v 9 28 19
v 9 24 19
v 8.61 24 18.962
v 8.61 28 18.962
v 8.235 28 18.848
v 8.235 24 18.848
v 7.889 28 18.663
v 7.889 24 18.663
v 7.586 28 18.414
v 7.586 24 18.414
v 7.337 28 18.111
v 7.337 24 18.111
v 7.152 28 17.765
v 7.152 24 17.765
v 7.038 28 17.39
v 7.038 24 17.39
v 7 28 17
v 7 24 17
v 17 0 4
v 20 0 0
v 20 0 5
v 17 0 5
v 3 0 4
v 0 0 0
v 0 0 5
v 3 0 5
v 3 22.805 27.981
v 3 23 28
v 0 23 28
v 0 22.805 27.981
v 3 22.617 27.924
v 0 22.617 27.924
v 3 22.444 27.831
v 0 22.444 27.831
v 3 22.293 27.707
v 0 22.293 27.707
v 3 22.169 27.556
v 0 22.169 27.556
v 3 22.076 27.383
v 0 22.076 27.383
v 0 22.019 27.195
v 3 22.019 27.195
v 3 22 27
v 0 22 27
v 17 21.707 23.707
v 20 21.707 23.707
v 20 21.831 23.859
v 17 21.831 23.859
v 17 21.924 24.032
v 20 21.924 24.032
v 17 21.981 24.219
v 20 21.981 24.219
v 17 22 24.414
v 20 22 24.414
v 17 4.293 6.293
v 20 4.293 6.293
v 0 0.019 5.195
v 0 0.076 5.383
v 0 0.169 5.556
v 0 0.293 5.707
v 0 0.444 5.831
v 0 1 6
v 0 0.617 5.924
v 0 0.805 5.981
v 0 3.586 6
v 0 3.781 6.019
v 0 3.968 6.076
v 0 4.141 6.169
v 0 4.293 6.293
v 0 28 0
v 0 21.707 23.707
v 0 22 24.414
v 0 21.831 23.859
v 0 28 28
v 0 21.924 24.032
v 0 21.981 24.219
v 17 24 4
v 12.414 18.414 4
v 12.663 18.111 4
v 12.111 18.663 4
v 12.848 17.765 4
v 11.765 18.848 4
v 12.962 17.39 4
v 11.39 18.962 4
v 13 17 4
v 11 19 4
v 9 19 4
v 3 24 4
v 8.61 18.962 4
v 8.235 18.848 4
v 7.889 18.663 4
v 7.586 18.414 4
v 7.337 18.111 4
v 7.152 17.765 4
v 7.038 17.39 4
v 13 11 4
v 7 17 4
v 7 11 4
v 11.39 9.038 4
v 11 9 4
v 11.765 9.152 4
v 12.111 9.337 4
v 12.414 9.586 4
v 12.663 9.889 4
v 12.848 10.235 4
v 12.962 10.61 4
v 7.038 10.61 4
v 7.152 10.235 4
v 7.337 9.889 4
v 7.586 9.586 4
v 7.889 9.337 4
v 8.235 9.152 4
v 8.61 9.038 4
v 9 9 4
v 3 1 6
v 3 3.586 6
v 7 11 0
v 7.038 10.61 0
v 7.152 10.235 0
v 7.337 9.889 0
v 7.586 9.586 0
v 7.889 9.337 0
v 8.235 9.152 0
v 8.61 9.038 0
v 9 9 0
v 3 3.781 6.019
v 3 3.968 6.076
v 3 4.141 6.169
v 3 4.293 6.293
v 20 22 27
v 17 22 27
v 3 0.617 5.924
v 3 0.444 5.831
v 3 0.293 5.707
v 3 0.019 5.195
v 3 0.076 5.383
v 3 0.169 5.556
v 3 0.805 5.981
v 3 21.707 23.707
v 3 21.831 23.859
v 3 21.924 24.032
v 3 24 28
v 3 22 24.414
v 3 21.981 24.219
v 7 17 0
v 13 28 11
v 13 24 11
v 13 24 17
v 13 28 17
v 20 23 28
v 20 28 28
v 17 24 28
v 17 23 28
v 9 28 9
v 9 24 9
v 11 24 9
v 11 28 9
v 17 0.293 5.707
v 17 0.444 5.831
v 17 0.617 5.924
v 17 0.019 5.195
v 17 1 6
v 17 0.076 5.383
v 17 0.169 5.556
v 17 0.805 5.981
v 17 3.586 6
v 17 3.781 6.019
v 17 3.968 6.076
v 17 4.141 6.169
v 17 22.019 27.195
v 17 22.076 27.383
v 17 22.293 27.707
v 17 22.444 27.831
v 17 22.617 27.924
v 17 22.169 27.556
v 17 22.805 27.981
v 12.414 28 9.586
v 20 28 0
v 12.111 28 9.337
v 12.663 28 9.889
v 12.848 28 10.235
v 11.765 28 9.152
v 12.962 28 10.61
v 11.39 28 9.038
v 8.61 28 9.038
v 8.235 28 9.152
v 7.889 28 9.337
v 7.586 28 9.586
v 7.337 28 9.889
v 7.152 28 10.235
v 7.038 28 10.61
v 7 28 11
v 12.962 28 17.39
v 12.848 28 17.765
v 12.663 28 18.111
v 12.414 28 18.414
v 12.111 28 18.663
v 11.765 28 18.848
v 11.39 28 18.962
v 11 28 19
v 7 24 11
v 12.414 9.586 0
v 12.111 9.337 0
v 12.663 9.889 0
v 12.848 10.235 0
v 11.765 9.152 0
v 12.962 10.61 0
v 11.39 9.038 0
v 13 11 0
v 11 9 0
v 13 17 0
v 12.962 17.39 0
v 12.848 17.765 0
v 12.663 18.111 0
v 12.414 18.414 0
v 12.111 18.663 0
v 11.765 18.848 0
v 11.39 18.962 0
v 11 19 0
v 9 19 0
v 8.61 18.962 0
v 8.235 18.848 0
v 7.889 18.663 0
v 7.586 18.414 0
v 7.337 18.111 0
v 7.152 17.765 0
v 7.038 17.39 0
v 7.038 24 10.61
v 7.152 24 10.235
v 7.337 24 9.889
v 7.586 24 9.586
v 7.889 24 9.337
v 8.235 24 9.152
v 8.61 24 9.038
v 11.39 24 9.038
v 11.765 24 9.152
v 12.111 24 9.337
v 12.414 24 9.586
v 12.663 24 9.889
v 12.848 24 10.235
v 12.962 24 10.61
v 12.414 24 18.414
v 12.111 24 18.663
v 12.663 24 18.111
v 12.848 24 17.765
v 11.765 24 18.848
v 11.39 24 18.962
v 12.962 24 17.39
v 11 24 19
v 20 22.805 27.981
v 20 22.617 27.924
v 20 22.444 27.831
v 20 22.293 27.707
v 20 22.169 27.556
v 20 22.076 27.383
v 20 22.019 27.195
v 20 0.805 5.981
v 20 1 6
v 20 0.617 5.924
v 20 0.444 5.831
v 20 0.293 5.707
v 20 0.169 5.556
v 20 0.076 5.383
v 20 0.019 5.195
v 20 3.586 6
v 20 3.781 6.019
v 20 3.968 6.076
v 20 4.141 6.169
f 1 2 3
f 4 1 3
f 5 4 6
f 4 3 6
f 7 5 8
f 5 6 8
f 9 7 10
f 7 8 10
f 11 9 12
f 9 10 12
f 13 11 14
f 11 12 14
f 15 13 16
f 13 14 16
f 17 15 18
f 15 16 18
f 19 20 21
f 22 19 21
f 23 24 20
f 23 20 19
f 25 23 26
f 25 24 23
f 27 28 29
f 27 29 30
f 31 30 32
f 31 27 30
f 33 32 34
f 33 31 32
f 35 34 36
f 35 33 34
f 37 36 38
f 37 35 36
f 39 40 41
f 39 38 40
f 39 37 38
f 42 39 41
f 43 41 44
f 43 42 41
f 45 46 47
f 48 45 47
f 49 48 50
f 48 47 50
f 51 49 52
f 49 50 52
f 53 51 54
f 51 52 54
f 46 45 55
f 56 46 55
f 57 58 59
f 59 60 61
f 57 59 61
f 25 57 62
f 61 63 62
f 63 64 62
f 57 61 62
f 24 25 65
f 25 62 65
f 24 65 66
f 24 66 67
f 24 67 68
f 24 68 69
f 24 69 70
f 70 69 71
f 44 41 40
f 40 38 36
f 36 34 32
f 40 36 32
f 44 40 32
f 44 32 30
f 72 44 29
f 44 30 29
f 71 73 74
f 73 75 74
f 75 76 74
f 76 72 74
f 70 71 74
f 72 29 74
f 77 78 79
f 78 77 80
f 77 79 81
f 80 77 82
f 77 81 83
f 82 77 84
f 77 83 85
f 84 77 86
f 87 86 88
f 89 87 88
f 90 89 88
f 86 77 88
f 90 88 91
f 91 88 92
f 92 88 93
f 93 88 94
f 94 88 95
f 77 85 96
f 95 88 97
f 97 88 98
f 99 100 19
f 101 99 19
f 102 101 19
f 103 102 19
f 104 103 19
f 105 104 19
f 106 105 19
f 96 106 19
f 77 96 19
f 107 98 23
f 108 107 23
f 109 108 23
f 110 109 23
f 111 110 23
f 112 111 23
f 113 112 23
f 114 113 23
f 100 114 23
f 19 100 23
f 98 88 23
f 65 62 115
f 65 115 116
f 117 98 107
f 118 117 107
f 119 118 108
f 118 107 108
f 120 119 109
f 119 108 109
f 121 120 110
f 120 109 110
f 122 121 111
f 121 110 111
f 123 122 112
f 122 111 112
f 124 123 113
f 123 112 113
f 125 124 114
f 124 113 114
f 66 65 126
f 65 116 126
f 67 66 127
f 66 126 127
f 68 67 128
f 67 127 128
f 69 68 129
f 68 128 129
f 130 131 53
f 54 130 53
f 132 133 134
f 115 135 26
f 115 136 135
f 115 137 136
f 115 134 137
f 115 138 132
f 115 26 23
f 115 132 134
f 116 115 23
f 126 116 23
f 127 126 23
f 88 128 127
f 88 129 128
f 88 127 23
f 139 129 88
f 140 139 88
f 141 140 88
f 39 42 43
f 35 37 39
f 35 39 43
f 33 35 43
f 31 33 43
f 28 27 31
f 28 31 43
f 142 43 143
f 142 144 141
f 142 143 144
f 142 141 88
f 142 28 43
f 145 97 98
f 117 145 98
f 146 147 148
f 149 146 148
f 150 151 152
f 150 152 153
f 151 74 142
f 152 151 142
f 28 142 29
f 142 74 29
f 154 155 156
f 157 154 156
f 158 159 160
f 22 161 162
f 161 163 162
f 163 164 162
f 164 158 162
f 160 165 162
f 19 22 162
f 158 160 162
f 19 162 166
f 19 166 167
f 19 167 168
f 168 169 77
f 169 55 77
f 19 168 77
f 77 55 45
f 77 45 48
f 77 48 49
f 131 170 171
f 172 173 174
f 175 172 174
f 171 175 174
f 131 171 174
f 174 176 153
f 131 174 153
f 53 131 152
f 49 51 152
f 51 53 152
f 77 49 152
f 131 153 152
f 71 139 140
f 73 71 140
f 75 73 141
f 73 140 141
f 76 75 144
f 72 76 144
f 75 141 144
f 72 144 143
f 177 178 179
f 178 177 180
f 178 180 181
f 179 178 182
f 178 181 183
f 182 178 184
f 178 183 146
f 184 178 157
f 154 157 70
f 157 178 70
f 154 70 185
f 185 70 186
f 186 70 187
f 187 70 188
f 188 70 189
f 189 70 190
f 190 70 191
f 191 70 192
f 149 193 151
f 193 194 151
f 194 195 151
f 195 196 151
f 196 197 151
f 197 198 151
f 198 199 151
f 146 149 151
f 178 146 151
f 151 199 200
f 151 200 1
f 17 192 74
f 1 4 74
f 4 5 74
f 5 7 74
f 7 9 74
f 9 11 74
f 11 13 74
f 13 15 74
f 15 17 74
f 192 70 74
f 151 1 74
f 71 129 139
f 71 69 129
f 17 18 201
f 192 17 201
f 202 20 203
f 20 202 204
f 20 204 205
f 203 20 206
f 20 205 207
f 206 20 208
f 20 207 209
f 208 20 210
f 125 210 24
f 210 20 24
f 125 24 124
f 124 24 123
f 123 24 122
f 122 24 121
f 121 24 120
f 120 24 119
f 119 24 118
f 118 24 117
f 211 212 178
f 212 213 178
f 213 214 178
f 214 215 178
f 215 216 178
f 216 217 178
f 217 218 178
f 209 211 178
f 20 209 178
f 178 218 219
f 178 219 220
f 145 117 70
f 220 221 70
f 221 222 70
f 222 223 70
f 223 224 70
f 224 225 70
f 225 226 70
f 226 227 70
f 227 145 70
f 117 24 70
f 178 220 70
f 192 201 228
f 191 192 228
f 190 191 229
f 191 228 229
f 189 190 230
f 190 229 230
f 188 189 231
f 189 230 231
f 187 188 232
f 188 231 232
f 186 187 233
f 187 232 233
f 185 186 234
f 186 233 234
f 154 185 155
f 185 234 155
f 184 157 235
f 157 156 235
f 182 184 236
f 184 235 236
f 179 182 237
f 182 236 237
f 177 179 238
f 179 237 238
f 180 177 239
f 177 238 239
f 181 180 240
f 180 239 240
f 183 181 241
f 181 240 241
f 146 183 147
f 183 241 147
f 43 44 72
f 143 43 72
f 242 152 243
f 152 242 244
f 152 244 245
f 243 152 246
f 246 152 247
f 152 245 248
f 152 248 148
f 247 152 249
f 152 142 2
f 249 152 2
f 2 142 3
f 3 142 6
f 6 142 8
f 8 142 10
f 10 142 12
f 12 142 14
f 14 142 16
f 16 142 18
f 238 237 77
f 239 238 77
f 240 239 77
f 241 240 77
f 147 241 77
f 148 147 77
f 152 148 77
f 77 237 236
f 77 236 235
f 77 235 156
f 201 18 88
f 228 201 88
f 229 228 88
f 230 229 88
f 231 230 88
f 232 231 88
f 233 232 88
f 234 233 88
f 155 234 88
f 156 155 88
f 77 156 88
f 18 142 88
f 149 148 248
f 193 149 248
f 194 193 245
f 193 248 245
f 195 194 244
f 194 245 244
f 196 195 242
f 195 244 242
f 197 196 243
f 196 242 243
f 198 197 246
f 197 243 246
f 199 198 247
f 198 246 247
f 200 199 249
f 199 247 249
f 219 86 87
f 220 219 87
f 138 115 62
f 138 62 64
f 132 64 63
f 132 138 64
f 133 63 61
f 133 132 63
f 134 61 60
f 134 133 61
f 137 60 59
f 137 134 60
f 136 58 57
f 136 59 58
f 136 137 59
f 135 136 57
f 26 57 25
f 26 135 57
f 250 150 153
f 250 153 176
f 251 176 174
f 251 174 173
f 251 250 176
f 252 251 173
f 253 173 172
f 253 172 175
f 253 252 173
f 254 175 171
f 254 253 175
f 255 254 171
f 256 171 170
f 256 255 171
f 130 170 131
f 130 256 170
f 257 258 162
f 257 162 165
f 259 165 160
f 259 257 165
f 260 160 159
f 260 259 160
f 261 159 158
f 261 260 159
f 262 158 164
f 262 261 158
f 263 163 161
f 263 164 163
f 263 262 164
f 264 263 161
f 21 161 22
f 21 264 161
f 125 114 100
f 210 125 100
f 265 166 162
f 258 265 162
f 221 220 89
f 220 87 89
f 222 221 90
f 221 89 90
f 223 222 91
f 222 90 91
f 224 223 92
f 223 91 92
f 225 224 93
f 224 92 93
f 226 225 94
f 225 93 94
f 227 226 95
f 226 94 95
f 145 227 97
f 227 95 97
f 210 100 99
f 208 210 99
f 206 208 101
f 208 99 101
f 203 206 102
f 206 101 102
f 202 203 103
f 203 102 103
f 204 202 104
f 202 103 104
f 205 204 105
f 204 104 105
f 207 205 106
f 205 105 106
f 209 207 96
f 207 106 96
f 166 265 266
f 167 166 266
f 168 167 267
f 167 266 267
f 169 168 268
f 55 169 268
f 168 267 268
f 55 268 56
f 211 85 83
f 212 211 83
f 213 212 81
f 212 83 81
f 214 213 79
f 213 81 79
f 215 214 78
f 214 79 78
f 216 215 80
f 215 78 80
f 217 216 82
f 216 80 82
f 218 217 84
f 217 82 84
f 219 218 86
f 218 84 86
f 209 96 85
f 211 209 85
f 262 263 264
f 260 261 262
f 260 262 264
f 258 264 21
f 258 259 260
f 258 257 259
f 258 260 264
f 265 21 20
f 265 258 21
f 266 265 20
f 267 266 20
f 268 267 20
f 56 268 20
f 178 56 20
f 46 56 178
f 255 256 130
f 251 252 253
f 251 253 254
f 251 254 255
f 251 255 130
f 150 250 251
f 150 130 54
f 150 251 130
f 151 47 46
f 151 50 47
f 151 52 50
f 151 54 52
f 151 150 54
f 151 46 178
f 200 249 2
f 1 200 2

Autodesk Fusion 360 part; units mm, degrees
sketch "Sketch1" plane through (0, 0, 0) normal (1, 0, 0) x (0, 1, 0)
  line L0 (0, 0) -> (28, 0)
  line L1 (28, 0) -> (28, 28)
  line L2 (28, 28) -> (22, 28)
  line L3 (22, 28) -> (22, 24)
  line L4 (0, 0) -> (0, 6)
  line L5 (0, 6) -> (4, 6)
  line L6 (4, 6) -> (22, 24)
  dimension "d1" = 28
  dimension "d2" = 28
extrude "Extrude1" add sketch "Sketch1" along normal blind 3
sketch "Sketch2" plane through (3, 0, 0) normal (1, 0, 0) x (0, 1, 0)
  line L0 (0, 0) -> (28, 0)
  line L1 (28, 0) -> (28, 28)
  line L2 (28, 28) -> (22, 28)
  line L3 (22, 28) -> (22, 24)
  line L4 (22, 24) -> (4, 6)
  line L5 (4, 6) -> (0, 6)
  line L6 (0, 6) -> (0, 0)
  line L7 (0, 0) -> (28, 0)
  line L8 (28, 0) -> (28, 4)
  line L9 (24, 4) -> (0, 4)
  line L10 (0, 4) -> (0, 0)
  line L11 (28, 28) -> (24, 28)
  line L12 (24, 28) -> (24, 4)
  line L13 (24, 0) -> (28, 0)
  line L14 (28, 0) -> (28, 28)
  dimension "d5" = 4
  dimension "d6" = 28
extrude "Extrude2" add sketch "Sketch2" along normal blind 14 contours L0 L1 L2 L6 L7 L8 L9 L10 L11 L12 L13 L14
sketch "Sketch3" plane through (17, 0, 0) normal (1, 0, 0) x (0, 1, 0)
  line L0 (28, 0) -> (28, 28)
  line L1 (28, 28) -> (24, 28)
  line L2 (24, 28) -> (24, 4)
  line L3 (24, 4) -> (0, 4)
  line L4 (0, 4) -> (0, 0)
  line L5 (0, 0) -> (28, 0)
  line L6 (0, 0) -> (28, 0)
  line L7 (28, 28) -> (28, 0)
  line L8 (28, 28) -> (22, 28)
  line L9 (22, 28) -> (22, 24)
  line L10 (22, 24) -> (4, 6)
  line L11 (4, 6) -> (0, 6)
  line L12 (0, 6) -> (0, 0)
sketch "Sketch4" plane through (17, 0, 0) normal (1, 0, 0) x (0, 1, 0)
extrude "Extrude3" add sketch "Sketch3" along normal blind 3
sketch "Sketch5" plane through (0, 24, 0) normal (0, -1, 0) x (1, 0, 0)
  line L0 (3, 28) -> (3, 4)
  line L1 (3, 4) -> (17, 4)
  line L2 (17, 4) -> (17, 28)
  line L3 (17, 28) -> (3, 28)
fillet "Fillet1" radius 1 1 edges at (1.5, 22, 28)
fillet "Fillet2" radius 1 1 edges at (18.5, 22, 28)
fillet "Fillet3" radius 1 1 edges at (1.5, 0, 6)
fillet "Fillet4" radius 1 1 edges at (18.5, 0, 6)
fillet "Fillet5" radius 1 1 edges at (1.5, 4, 6)
fillet "Fillet6" radius 1 1 edges at (18.5, 4, 6)
fillet "Fillet7" radius 1 1 edges at (1.5, 22, 24)
fillet "Fillet8" radius 1 1 edges at (18.5, 22, 24)
sketch "Sketch6" plane through (0, 24, 0) normal (0, -1, 0) x (1, 0, 0)
  line L0 (11, 19) -> (9, 19)
  line L1 (7, 17) -> (7, 11)
  line L2 (9, 9) -> (11, 9)
  line L3 (13, 11) -> (13, 17)
  line L4 (13, 19) -> (7, 9) construction
  line L5 (7, 19) -> (13, 9) construction
  arc A0 (9, 19) -> (7, 17) centre (9, 17) ccw
  arc A1 (13, 17) -> (11, 19) centre (11, 17) ccw
  arc A2 (11, 9) -> (13, 11) centre (11, 11) ccw
  arc A3 (7, 11) -> (9, 9) centre (9, 11) ccw
  point P0 (10, 14)
  dimension "d27" = 6
  dimension "d28" = 10
  dimension "d29" = 2
extrude "Extrude4" cut sketch "Sketch6" against normal blind 7
sketch "Sketch7" plane through (0, 0, 4) normal (0, 0, 1) x (-1, 0, 0)
  line L0 (-3, -24) -> (-3, 0)
  line L1 (-3, 0) -> (-17, 0)
  line L2 (-17, 0) -> (-17, -24)
  line L3 (-17, -24) -> (-3, -24)
  line L4 (-9, -9) -> (-11, -9)
  line L5 (-13, -11) -> (-13, -17)
  line L6 (-11, -19) -> (-9, -19)
  line L7 (-7, -17) -> (-7, -11)
  line L8 (-7, -9) -> (-13, -19) construction
  line L9 (-13, -9) -> (-7, -19) construction
  arc A0 (-9, -19) -> (-7, -17) centre (-9, -17) ccw
  arc A1 (-7, -11) -> (-9, -9) centre (-9, -11) ccw
  arc A2 (-13, -17) -> (-11, -19) centre (-11, -17) ccw
  arc A3 (-11, -9) -> (-13, -11) centre (-11, -11) ccw
  point P0 (-10, -14)
  dimension "d32" = 6
  dimension "d33" = 10
  dimension "d34" = 2
extrude "Extrude5" cut sketch "Sketch7" against normal blind 4 contours L4 L5 L6 L7 A0 A1 A2 A3
